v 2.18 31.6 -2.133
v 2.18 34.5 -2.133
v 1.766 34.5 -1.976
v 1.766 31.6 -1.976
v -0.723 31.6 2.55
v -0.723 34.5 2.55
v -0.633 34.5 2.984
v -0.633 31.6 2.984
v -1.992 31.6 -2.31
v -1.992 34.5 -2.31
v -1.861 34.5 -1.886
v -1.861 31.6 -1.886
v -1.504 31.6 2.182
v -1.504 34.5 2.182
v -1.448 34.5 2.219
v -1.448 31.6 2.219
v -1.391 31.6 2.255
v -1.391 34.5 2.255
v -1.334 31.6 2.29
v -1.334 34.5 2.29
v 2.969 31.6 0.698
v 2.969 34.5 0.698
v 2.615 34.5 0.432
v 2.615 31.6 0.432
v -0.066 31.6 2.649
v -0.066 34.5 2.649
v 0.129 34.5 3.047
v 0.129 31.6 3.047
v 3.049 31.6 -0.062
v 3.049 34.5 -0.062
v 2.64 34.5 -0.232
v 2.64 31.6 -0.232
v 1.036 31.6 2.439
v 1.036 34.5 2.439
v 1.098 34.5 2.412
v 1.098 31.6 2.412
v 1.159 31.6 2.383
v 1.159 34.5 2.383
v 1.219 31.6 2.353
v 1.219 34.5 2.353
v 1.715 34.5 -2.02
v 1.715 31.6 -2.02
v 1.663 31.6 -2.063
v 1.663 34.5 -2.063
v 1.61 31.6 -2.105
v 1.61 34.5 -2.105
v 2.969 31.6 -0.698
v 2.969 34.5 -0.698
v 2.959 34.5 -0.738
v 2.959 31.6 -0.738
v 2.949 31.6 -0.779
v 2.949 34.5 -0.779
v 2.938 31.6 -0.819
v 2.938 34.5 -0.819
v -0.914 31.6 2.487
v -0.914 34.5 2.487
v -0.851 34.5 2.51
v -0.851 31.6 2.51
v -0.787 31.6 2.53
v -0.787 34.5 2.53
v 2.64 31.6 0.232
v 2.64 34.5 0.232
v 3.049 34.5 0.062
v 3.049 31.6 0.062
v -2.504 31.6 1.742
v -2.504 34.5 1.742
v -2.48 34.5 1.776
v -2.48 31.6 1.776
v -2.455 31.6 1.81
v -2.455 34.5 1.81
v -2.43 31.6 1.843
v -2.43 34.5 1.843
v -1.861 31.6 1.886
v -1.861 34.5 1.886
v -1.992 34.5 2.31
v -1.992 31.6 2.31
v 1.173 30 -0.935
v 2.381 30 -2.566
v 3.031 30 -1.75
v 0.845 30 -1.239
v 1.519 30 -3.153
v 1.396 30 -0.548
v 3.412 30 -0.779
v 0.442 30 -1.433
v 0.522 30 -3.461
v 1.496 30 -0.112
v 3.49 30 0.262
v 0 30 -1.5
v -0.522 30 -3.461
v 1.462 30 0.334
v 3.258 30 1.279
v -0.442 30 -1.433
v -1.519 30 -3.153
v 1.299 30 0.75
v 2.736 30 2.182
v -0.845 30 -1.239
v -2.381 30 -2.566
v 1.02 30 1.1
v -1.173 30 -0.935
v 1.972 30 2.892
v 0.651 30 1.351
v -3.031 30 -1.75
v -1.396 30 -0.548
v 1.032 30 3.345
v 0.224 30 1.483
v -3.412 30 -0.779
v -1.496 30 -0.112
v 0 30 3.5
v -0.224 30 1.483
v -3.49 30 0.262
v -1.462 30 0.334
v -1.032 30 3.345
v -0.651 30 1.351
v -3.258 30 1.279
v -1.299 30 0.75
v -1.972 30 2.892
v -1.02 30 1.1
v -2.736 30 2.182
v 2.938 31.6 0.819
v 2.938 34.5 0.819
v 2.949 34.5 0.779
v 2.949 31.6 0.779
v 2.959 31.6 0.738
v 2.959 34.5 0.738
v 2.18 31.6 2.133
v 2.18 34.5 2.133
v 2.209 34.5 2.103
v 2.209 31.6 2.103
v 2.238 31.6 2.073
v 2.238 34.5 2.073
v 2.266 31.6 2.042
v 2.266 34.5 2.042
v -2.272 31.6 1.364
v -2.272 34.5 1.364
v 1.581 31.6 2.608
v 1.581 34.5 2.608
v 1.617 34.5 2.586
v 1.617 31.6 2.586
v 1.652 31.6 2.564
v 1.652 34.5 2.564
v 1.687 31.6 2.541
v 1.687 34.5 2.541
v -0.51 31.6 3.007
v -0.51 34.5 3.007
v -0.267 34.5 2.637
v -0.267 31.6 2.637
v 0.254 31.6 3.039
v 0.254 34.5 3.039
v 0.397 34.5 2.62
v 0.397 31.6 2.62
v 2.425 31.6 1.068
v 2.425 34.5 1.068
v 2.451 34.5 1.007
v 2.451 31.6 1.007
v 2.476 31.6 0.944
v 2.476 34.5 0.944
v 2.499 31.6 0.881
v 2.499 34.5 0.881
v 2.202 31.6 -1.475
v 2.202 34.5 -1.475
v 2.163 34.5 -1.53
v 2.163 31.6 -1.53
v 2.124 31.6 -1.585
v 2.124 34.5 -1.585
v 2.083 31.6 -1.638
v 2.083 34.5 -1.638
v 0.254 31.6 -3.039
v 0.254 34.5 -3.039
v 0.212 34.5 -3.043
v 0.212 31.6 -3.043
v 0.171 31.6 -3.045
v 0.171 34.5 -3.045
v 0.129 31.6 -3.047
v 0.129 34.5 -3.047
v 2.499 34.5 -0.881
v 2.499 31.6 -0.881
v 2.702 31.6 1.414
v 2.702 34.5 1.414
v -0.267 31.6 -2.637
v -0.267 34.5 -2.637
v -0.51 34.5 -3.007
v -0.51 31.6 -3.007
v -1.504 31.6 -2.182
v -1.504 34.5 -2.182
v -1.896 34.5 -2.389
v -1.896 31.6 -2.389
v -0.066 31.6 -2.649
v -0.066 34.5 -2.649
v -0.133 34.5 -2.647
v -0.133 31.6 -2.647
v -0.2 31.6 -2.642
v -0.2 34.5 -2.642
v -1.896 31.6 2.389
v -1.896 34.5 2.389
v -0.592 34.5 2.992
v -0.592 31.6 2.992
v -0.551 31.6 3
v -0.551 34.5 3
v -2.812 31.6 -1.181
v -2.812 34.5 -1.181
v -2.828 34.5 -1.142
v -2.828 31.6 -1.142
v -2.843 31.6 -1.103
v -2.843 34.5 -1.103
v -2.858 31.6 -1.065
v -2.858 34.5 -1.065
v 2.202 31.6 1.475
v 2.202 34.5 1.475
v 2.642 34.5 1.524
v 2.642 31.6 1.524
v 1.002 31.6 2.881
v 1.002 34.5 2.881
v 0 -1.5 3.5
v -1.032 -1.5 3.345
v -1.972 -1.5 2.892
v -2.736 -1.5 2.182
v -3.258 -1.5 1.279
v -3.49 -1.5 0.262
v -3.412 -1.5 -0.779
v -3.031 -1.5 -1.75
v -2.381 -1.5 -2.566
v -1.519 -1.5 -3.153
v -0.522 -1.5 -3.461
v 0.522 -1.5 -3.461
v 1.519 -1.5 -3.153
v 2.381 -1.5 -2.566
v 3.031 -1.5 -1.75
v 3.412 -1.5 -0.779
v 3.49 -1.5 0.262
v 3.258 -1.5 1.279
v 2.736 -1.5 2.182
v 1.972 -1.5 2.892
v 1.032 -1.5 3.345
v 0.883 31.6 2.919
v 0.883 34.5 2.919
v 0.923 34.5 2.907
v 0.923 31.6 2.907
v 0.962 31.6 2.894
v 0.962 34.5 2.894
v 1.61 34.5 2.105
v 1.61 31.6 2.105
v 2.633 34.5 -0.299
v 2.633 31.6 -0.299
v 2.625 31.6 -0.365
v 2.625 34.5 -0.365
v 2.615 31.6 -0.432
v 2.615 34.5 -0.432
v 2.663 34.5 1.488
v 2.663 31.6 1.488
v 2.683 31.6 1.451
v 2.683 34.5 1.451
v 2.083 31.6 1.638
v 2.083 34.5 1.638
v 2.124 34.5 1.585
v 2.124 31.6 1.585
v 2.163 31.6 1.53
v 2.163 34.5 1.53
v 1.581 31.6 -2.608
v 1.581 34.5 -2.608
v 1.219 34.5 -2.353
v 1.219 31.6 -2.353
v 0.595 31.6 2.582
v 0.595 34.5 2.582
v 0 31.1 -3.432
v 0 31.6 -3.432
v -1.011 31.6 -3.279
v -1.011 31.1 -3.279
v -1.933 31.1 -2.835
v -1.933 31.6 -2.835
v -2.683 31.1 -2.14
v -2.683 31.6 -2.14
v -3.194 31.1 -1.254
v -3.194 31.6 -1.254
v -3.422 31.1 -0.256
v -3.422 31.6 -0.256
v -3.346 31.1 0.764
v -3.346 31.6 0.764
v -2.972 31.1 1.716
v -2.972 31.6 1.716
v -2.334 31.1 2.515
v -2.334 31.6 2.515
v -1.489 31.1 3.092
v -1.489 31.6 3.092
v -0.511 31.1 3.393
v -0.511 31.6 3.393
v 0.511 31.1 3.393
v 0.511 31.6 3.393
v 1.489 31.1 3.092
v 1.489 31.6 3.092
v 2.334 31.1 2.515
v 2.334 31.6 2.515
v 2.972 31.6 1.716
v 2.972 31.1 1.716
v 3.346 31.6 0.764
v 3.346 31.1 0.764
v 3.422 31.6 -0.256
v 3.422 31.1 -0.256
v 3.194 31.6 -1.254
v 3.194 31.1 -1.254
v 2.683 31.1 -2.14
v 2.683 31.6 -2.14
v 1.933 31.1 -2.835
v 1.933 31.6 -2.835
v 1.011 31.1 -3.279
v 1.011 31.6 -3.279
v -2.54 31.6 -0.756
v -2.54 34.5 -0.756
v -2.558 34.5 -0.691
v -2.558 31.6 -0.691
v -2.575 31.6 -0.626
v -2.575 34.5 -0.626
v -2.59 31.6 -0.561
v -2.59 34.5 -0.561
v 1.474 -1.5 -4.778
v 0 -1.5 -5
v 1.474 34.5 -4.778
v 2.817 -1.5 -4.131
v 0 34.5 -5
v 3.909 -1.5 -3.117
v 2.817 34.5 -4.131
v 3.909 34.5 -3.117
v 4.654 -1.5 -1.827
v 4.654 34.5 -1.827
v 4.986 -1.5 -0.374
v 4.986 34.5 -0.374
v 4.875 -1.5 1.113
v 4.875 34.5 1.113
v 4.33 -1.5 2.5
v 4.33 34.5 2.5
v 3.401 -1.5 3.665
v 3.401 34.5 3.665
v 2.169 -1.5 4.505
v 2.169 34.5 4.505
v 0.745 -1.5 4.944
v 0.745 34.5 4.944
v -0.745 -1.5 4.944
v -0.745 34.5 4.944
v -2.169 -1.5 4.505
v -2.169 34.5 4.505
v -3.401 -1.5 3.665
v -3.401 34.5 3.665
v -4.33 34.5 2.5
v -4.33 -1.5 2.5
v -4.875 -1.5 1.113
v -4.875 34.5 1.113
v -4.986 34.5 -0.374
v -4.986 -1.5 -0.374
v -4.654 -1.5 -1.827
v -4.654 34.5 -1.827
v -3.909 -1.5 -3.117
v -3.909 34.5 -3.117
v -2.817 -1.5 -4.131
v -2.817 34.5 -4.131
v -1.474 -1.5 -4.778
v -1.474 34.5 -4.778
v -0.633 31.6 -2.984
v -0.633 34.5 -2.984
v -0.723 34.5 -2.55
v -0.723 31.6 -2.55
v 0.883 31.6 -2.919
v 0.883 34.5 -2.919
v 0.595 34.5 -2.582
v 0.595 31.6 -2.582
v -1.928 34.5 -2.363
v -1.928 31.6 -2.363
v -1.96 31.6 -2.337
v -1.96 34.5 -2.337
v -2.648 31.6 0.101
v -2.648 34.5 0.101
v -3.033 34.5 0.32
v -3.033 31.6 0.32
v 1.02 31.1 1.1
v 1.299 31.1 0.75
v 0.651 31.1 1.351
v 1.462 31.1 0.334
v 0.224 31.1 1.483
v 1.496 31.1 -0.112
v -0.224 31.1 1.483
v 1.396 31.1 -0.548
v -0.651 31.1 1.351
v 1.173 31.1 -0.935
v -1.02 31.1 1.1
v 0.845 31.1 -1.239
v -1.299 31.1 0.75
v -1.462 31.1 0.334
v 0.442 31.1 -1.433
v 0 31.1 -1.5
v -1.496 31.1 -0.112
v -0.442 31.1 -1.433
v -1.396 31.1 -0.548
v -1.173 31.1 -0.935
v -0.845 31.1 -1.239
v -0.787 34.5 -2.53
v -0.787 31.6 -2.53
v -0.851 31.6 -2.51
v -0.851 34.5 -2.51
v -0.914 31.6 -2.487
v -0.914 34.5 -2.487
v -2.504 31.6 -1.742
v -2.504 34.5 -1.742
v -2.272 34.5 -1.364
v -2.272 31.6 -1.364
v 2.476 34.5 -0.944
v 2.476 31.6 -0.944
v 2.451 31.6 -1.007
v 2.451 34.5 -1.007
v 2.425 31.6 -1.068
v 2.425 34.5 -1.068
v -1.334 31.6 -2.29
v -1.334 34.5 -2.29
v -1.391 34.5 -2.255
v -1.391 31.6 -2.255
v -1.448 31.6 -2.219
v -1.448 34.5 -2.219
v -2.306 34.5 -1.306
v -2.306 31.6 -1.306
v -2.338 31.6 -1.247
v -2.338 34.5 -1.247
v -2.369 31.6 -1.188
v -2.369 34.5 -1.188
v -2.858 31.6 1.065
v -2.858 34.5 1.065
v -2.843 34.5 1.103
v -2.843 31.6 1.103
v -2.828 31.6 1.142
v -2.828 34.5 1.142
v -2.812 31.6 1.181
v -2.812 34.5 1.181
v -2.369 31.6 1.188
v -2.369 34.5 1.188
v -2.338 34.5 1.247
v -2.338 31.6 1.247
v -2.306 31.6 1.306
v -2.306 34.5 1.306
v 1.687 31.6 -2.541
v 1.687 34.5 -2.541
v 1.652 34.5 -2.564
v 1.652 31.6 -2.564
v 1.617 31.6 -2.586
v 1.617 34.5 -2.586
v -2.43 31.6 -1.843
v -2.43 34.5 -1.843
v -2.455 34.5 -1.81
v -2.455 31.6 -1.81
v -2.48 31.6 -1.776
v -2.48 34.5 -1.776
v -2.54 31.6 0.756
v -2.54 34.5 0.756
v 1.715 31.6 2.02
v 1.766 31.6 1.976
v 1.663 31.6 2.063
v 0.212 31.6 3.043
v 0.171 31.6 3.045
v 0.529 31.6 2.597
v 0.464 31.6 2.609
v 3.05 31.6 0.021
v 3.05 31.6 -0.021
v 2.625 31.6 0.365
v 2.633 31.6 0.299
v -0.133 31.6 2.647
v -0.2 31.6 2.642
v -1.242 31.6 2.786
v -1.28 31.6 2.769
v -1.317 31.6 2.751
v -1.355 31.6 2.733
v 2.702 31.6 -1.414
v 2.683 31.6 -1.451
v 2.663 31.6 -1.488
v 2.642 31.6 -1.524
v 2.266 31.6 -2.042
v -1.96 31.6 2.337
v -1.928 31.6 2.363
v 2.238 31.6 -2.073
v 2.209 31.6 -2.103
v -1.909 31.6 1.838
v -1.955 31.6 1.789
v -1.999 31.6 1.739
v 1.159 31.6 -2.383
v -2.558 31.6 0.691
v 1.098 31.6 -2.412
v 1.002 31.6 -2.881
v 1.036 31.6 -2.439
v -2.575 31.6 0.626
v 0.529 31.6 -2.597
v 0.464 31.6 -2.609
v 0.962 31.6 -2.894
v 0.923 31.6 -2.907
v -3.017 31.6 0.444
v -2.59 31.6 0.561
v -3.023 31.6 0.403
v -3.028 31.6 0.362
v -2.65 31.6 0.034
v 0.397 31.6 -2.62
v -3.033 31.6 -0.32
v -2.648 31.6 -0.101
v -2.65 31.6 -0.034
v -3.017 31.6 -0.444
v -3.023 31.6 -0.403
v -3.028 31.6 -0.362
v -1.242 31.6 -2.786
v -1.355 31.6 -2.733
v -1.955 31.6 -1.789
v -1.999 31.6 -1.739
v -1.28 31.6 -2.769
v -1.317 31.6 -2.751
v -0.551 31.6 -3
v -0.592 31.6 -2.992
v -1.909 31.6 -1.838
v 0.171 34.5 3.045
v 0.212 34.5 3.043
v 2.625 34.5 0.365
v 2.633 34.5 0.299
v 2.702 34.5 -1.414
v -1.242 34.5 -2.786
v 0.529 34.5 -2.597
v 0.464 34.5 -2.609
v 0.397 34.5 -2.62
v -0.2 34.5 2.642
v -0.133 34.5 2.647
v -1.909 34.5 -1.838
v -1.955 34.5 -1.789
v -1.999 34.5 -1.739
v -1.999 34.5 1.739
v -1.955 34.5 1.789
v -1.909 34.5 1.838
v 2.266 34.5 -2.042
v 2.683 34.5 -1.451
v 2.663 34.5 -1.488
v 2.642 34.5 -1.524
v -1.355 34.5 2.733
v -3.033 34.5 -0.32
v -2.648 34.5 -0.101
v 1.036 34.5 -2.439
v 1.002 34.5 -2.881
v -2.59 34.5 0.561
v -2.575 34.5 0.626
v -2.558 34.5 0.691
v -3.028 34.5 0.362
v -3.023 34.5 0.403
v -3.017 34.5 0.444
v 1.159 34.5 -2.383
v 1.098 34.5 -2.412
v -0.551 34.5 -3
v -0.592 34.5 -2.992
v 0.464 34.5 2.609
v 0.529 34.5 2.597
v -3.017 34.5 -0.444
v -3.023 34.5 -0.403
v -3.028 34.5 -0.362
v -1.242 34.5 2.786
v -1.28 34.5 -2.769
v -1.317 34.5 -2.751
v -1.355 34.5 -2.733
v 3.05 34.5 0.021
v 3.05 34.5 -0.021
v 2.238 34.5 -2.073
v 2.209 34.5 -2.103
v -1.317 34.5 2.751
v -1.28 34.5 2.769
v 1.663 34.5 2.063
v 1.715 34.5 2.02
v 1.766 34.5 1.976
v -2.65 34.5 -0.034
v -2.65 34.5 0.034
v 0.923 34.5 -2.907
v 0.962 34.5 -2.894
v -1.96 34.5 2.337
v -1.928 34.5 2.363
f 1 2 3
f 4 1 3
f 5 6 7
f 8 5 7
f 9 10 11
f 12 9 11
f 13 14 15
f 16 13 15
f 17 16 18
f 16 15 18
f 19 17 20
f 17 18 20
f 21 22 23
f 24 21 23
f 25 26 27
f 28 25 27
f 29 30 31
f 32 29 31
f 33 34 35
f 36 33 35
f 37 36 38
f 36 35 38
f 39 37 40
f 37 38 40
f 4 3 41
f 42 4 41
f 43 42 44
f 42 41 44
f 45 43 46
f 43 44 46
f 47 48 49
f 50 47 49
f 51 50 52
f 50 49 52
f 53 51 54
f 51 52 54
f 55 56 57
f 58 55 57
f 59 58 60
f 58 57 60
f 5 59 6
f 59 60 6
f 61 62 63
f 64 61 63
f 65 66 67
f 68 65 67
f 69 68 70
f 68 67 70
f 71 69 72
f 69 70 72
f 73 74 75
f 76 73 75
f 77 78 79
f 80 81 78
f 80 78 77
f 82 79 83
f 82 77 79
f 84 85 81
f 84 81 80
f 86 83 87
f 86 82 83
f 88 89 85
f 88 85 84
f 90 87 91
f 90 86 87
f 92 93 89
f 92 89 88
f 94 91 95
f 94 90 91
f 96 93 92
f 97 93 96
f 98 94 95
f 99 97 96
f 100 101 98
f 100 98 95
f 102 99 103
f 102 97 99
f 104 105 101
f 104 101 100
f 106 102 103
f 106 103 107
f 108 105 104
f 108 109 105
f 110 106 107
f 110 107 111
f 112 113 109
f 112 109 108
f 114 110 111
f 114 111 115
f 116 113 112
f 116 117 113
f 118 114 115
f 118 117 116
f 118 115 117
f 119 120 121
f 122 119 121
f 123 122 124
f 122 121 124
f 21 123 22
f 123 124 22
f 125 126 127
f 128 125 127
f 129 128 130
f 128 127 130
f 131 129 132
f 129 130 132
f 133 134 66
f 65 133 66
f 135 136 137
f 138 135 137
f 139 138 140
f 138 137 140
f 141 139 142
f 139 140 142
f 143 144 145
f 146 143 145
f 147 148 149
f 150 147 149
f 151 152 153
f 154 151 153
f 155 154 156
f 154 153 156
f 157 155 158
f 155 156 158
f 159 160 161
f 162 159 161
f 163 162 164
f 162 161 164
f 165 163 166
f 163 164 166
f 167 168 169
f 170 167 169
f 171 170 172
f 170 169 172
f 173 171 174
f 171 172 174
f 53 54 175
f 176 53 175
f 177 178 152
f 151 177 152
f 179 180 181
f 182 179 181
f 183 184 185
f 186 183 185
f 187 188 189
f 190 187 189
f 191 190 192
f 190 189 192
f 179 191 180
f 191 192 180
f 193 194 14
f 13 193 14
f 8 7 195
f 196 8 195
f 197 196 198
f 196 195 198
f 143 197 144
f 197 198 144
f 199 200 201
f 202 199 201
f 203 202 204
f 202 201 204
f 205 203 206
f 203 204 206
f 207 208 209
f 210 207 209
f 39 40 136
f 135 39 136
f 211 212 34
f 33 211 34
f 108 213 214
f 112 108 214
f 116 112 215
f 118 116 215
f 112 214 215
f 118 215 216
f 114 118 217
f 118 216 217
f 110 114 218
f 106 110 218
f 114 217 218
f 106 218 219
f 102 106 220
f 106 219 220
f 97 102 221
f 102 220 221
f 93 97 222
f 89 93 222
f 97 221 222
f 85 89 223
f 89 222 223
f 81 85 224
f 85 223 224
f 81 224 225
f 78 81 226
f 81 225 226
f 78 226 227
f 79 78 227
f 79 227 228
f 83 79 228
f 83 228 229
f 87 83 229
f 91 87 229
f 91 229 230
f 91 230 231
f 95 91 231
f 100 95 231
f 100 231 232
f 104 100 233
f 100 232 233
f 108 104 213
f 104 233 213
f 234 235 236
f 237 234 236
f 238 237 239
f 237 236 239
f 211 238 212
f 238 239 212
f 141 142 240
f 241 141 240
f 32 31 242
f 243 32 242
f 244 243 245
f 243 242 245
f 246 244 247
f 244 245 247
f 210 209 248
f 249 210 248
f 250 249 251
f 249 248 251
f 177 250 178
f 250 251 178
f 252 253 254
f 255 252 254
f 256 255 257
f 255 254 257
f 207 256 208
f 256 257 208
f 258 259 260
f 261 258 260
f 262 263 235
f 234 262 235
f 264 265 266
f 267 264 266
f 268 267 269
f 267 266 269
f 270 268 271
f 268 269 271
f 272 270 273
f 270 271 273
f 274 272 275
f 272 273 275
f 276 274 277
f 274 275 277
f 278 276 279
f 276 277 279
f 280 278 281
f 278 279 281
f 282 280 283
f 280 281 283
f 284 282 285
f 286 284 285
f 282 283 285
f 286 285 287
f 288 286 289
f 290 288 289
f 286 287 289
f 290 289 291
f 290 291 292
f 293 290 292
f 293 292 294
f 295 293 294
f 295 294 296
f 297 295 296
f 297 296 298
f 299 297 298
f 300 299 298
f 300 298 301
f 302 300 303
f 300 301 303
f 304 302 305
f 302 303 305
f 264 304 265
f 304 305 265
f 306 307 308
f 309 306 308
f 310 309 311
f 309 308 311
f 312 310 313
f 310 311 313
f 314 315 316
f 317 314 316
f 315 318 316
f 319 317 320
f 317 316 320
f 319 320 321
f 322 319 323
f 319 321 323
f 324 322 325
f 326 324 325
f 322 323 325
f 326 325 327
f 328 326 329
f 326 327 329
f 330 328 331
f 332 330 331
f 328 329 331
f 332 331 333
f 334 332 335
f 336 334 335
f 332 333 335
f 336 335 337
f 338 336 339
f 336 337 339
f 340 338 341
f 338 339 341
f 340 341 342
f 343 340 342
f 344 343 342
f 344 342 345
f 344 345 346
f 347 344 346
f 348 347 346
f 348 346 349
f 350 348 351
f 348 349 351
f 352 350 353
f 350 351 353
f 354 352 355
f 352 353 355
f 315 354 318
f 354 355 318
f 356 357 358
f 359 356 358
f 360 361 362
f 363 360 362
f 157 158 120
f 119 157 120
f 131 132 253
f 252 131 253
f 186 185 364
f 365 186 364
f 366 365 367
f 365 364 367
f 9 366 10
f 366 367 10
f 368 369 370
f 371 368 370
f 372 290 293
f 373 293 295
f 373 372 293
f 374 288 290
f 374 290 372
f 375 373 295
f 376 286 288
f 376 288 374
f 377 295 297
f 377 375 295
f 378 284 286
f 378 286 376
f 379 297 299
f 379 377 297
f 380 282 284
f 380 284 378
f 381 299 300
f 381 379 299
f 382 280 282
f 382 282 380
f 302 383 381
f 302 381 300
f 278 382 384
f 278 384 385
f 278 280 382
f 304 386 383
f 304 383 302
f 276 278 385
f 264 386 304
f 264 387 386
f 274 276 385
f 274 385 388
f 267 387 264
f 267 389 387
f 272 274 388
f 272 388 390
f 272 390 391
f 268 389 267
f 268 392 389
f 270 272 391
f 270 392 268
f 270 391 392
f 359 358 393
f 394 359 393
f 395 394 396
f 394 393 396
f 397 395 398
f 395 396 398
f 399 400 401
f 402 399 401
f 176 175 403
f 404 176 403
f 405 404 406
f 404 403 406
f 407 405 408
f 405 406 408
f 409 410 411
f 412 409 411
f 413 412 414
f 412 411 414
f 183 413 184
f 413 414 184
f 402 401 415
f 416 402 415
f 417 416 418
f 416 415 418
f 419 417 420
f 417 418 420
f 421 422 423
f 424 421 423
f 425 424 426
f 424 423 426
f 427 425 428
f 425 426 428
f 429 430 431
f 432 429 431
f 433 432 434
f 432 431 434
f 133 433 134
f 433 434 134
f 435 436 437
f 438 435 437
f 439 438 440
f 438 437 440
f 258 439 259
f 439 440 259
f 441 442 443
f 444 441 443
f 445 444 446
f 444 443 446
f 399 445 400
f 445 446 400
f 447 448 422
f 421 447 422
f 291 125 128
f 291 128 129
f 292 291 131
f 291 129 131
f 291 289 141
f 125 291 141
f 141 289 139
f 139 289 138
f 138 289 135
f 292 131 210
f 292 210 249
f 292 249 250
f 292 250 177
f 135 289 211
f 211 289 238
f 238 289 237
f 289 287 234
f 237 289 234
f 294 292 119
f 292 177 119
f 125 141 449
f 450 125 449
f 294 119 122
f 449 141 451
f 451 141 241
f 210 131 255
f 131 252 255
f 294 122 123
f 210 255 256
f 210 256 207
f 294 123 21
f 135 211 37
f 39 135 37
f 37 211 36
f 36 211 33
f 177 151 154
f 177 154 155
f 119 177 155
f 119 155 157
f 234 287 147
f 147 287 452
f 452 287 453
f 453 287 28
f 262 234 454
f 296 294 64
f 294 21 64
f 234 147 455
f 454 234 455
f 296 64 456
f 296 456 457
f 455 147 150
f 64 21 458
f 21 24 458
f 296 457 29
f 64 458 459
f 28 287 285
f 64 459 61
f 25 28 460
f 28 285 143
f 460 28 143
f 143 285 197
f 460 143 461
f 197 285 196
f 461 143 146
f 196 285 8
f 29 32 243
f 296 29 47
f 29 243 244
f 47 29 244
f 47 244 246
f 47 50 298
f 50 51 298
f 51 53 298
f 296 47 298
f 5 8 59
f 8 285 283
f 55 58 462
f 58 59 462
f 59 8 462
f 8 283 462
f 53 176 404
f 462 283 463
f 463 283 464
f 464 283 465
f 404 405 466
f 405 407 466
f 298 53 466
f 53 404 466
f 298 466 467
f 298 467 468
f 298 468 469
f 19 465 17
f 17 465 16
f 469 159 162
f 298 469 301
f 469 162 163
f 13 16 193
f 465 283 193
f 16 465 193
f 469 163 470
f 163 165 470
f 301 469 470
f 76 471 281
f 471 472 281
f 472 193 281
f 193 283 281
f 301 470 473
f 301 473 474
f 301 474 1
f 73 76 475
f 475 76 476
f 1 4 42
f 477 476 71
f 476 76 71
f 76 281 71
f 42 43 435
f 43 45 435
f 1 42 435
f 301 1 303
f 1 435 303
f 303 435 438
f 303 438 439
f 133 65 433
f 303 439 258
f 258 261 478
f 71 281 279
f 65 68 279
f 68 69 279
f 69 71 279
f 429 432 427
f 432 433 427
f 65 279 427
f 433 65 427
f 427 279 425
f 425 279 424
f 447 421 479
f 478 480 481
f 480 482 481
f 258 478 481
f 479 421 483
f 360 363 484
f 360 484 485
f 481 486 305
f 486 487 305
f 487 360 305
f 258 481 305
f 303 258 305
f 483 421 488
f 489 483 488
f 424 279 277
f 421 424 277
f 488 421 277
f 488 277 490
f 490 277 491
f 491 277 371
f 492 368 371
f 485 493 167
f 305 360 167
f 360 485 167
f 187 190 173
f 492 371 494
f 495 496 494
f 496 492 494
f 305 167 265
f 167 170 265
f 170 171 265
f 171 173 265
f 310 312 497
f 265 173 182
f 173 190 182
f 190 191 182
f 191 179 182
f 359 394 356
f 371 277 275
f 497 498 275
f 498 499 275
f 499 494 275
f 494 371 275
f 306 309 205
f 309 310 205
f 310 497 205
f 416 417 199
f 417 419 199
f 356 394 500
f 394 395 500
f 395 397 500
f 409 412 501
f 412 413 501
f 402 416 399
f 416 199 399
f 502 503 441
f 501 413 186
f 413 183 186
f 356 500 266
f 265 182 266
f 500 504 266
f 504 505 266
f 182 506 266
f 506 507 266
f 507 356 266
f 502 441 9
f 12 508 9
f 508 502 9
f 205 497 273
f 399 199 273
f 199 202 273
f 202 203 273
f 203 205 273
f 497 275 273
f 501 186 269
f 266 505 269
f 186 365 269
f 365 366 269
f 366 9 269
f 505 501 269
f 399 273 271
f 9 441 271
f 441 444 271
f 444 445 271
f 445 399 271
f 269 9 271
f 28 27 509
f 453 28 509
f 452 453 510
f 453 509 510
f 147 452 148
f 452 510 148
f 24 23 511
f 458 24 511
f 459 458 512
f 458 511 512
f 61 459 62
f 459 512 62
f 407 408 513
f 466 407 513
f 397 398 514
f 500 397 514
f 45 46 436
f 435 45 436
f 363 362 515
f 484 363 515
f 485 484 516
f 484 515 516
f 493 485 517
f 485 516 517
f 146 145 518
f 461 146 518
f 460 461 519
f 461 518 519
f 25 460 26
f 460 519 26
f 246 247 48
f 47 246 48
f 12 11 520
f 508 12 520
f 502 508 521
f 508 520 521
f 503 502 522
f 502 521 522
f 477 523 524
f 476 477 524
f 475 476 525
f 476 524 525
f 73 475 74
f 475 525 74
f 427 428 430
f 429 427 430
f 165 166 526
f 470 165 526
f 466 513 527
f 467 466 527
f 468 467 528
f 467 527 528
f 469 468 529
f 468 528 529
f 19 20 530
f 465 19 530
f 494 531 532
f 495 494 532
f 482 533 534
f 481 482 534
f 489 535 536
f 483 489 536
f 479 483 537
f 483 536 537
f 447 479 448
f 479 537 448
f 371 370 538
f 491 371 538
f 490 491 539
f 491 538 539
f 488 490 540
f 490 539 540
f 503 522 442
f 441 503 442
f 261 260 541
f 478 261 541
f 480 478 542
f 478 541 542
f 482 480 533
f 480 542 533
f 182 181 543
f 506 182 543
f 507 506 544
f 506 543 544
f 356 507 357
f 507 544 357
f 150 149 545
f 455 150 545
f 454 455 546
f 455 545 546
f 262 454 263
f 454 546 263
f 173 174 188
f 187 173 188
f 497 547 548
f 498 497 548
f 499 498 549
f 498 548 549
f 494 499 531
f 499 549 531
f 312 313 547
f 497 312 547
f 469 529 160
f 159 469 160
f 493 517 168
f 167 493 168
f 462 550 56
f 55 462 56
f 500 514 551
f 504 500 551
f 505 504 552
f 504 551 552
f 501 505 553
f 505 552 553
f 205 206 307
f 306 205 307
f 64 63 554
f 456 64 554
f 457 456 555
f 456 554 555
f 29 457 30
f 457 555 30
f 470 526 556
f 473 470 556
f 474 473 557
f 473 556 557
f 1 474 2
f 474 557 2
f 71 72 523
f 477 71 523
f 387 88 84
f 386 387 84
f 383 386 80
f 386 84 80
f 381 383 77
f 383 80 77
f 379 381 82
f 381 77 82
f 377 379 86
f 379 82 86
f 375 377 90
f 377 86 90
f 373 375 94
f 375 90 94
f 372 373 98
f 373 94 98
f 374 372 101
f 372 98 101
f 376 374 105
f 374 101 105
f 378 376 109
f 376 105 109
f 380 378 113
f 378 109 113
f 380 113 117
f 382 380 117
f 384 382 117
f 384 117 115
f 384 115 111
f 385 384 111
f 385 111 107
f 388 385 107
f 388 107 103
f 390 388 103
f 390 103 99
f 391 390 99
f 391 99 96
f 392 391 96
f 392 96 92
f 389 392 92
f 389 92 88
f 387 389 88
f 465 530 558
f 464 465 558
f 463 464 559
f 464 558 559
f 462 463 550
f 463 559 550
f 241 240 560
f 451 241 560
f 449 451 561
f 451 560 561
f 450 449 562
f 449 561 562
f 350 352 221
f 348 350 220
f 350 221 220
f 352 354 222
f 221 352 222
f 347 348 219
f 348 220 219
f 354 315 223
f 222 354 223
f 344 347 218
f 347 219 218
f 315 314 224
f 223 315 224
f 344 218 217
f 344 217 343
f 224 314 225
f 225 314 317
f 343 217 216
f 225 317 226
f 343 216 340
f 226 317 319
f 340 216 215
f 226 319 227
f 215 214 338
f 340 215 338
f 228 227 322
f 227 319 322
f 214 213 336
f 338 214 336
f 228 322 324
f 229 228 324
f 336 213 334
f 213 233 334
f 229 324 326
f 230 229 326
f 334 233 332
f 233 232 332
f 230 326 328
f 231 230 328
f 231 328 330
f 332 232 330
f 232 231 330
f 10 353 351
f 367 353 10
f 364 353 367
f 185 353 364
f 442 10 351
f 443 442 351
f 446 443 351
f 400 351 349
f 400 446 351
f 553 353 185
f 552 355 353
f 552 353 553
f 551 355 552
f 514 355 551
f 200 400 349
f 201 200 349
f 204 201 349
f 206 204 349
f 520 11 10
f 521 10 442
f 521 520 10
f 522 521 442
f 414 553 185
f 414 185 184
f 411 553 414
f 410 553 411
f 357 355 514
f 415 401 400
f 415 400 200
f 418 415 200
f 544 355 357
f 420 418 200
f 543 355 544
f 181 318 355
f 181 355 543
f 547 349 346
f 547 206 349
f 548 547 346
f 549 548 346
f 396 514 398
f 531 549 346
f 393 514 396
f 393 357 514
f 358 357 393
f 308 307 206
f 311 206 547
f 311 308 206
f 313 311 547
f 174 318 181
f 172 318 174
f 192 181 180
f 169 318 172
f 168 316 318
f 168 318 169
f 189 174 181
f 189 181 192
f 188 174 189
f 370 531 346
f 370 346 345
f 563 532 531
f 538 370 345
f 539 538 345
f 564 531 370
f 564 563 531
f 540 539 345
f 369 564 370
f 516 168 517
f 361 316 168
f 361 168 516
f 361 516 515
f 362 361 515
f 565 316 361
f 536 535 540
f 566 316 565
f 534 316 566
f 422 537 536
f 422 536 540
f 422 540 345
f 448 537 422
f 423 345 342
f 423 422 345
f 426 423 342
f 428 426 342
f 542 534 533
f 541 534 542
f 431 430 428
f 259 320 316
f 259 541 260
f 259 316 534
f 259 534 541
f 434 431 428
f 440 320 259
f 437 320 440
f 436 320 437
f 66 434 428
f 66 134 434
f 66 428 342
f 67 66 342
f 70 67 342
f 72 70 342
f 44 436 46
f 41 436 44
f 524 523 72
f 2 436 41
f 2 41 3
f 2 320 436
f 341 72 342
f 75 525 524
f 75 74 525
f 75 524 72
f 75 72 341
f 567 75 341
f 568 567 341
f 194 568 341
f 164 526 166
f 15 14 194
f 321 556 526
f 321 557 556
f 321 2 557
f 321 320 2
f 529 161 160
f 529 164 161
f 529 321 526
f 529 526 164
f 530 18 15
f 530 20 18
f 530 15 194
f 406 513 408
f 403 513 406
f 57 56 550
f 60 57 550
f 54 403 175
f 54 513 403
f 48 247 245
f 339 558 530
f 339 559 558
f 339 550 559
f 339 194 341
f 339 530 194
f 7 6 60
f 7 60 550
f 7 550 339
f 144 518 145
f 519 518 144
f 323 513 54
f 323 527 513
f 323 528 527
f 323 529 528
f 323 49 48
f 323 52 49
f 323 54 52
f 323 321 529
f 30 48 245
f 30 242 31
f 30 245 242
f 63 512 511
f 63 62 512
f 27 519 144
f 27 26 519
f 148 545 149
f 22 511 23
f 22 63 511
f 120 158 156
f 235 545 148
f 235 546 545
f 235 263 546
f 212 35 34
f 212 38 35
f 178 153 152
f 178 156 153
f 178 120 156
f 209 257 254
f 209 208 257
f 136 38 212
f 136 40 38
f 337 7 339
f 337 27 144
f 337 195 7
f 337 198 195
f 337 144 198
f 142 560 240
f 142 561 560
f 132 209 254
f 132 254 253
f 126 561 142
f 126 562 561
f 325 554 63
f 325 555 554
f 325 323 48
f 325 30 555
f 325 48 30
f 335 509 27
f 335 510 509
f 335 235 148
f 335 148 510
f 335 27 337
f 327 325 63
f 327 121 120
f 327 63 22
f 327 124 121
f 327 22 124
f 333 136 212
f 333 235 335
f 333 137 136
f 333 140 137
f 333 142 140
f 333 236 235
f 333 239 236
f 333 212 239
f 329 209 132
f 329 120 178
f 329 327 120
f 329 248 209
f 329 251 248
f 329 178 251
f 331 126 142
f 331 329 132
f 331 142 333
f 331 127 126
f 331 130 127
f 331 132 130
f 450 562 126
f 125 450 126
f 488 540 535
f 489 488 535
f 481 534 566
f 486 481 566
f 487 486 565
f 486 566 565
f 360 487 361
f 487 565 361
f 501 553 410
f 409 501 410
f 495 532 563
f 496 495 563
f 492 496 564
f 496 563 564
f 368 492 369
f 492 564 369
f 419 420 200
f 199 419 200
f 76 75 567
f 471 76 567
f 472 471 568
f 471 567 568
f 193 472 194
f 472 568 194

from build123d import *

# Parameters (mm, degrees)
SKETCH1_W          = 5
SKETCH1_H          = 36
SKETCH2_R          = 3.43154
CUT_EXTRUDE1_DEPTH = 0.5
SKETCH3_R          = 3.5
CUT_EXTRUDE2_DEPTH = 31.5
CUT_EXTRUDE3_REACH = 34.284
SKETCH4_R          = 1.5
CUT_EXTRUDE4_REACH = 38.688


with BuildPart() as part:
    # Sketch1 → Revolve1 (revolve)
    with BuildSketch(Plane.XY, mode=Mode.PRIVATE) as revolve1_sk:
        with Locations((2.5, 16.5)):
            Rectangle(SKETCH1_W, SKETCH1_H)
    revolve(revolve1_sk.sketch.rotate(Axis((0, 34.5, 0), (0, -1, 0)), 270), axis=Axis((0, 34.5, 0), (0, -1, 0)))

    # Sketch2 → Cut-Extrude1 (cut)
    with BuildSketch(Plane(origin=(0, 31.6, 0), x_dir=(1, 0, 0), z_dir=(0, 1, 0))):
        with Locations(Location((0, 0, 0), (0, 0, 90))):
            Circle(SKETCH2_R)
    extrude(amount=-CUT_EXTRUDE1_DEPTH, mode=Mode.SUBTRACT)

    # Sketch3 → Cut-Extrude2 (cut)
    with BuildSketch(Plane.XZ.offset(1.5)):
        with Locations(Location((0, 0, 0), (0, 0, 90))):
            Circle(SKETCH3_R)
    extrude(amount=-CUT_EXTRUDE2_DEPTH, mode=Mode.SUBTRACT)

    # Sketch4 → Cut-Extrude3 (cut, up to next)
    with BuildSketch(Plane.XZ.offset(-30), mode=Mode.PRIVATE) as cut_extrude3_sk1:
        with Locations(Location((0, 0, 0), (0, 0, 270))):
            Circle(SKETCH4_R)
    cut_extrude3_tool1 = extrude(cut_extrude3_sk1.sketch, amount=-CUT_EXTRUDE3_REACH, mode=Mode.PRIVATE) & part.part
    add(cut_extrude3_tool1.solids().sort_by_distance((0, 30, 0))[0], mode=Mode.SUBTRACT)

    # Sketch5 → Cut-Extrude4 (cut, up to next)
    with BuildSketch(Plane(origin=(0, 34.5, 0), x_dir=(-1, 0, 0), z_dir=(0, 1, 0)), mode=Mode.PRIVATE) as cut_extrude4_sk1:
        with BuildLine():
            Line((2.430309722, 1.842849602), (1.999275165, 1.739367361))
            ThreePointArc((1.999275165, 1.739367361), (1.931766863, 1.814049831), (1.861470643, 1.886114272))
            Line((1.861470643, 1.886114272), (1.991813569, 2.309800577))
            ThreePointArc((1.991813569, 2.309800577), (1.944143169, 2.35006539), (1.895659013, 2.389346544))
            Line((1.895659013, 2.389346544), (1.503901187, 2.181921452))
            ThreePointArc((1.503901187, 2.181921452), (1.419941007, 2.237469003), (1.333931574, 2.289787448))
            Line((1.333931574, 2.289787448), (1.354813039, 2.732577836))
            ThreePointArc((1.354813039, 2.732577836), (1.298626839, 2.75972251), (1.241897077, 2.785712054))
            Line((1.241897077, 2.785712054), (0.914031566, 2.487377393))
            ThreePointArc((0.914031566, 2.487377393), (0.818895035, 2.520299768), (0.722576679, 2.549584857))
            Line((0.722576679, 2.549584857), (0.632684622, 2.98365718))
            ThreePointArc((0.632684622, 2.98365718), (0.571513009, 2.995976115), (0.51010218, 3.007041032))
            Line((0.51010218, 3.007041032), (0.26672998, 2.636542265))
            ThreePointArc((0.26672998, 2.636542265), (0.166394877, 2.64477083), (0.065819633, 2.649182473))
            Line((0.065819633, 2.649182473), (-0.129197696, 3.047262371))
            ThreePointArc((-0.129197696, 3.047262371), (-0.191511085, 3.043981522), (-0.253744312, 3.039426562))
            Line((-0.253744312, 3.039426562), (-0.397331231, 2.620043491))
            ThreePointArc((-0.397331231, 2.620043491), (-0.496560484, 2.603061214), (-0.595073102, 2.582322211))
            Line((-0.595073102, 2.582322211), (-0.882962048, 2.919396859))
            ThreePointArc((-0.882962048, 2.919396859), (-0.942501833, 2.900722375), (-1.001647117, 2.880833743))
            Line((-1.001647117, 2.880833743), (-1.03642666, 2.438917747))
            ThreePointArc((-1.03642666, 2.438917747), (-1.128315123, 2.397791689), (-1.218575206, 2.353205148))
            Line((-1.218575206, 2.353205148), (-1.581246647, 2.608094906))
            ThreePointArc((-1.581246647, 2.608094906), (-1.634271725, 2.575200173), (-1.686612749, 2.541227545))
            Line((-1.686612749, 2.541227545), (-1.61039959, 2.104545832))
            ThreePointArc((-1.61039959, 2.104545832), (-1.689173573, 2.041860093), (-1.765509747, 1.976227551))
            Line((-1.765509747, 1.976227551), (-2.180175704, 2.132916759))
            ThreePointArc((-2.180175704, 2.132916759), (-2.223354314, 2.087868673), (-2.2656023, 2.041946674))
            Line((-2.2656023, 2.041946674), (-2.083185191, 1.637937563))
            ThreePointArc((-2.083185191, 1.637937563), (-2.143895035, 1.557630919), (-2.201510819, 1.475076308))
            Line((-2.201510819, 1.475076308), (-2.642116303, 1.523719607))
            ThreePointArc((-2.642116303, 1.523719607), (-2.672735374, 1.469348706), (-2.702235725, 1.414362784))
            Line((-2.702235725, 1.414362784), (-2.425076605, 1.068411652))
            ThreePointArc((-2.425076605, 1.068411652), (-2.463907688, 0.975530065), (-2.499182869, 0.881240596))
            Line((-2.499182869, 0.881240596), (-2.938043018, 0.818781548))
            ThreePointArc((-2.938043018, 0.818781548), (-2.954178641, 0.758504156), (-2.969077742, 0.697909279))
            Line((-2.969077742, 0.697909279), (-2.614591538, 0.431753508))
            ThreePointArc((-2.614591538, 0.431753508), (-2.629103958, 0.332133069), (-2.639822068, 0.232033297))
            Line((-2.639822068, 0.232033297), (-3.049361685, 0.062396433))
            ThreePointArc((-3.049361685, 0.062396433), (-3.05, 0), (-3.049361685, -0.062396433))
            Line((-3.049361685, -0.062396433), (-2.639822068, -0.232033297))
            ThreePointArc((-2.639822068, -0.232033297), (-2.629103958, -0.332133069), (-2.614591538, -0.431753508))
            Line((-2.614591538, -0.431753508), (-2.969077742, -0.697909279))
            ThreePointArc((-2.969077742, -0.697909279), (-2.954178641, -0.758504156), (-2.938043018, -0.818781548))
            Line((-2.938043018, -0.818781548), (-2.499182869, -0.881240596))
            ThreePointArc((-2.499182869, -0.881240596), (-2.463907688, -0.975530065), (-2.425076605, -1.068411652))
            Line((-2.425076605, -1.068411652), (-2.702235725, -1.414362784))
            ThreePointArc((-2.702235725, -1.414362784), (-2.672735374, -1.469348706), (-2.642116303, -1.523719607))
            Line((-2.642116303, -1.523719607), (-2.201510819, -1.475076308))
            ThreePointArc((-2.201510819, -1.475076308), (-2.143895035, -1.557630919), (-2.083185191, -1.637937563))
            Line((-2.083185191, -1.637937563), (-2.2656023, -2.041946674))
            ThreePointArc((-2.2656023, -2.041946674), (-2.223354314, -2.087868673), (-2.180175704, -2.132916759))
            Line((-2.180175704, -2.132916759), (-1.765509747, -1.976227551))
            ThreePointArc((-1.765509747, -1.976227551), (-1.689173573, -2.041860093), (-1.61039959, -2.104545832))
            Line((-1.61039959, -2.104545832), (-1.686612749, -2.541227545))
            ThreePointArc((-1.686612749, -2.541227545), (-1.634271725, -2.575200173), (-1.581246647, -2.608094906))
            Line((-1.581246647, -2.608094906), (-1.218575206, -2.353205148))
            ThreePointArc((-1.218575206, -2.353205148), (-1.128315123, -2.397791689), (-1.03642666, -2.438917747))
            Line((-1.03642666, -2.438917747), (-1.001647117, -2.880833743))
            ThreePointArc((-1.001647117, -2.880833743), (-0.942501833, -2.900722375), (-0.882962048, -2.919396859))
            Line((-0.882962048, -2.919396859), (-0.595073102, -2.582322211))
            ThreePointArc((-0.595073102, -2.582322211), (-0.496560484, -2.603061214), (-0.397331231, -2.620043491))
            Line((-0.397331231, -2.620043491), (-0.253744312, -3.039426562))
            ThreePointArc((-0.253744312, -3.039426562), (-0.191511085, -3.043981522), (-0.129197696, -3.047262371))
            Line((-0.129197696, -3.047262371), (0.065819633, -2.649182473))
            ThreePointArc((0.065819633, -2.649182473), (0.166394877, -2.64477083), (0.26672998, -2.636542265))
            Line((0.26672998, -2.636542265), (0.51010218, -3.007041032))
            ThreePointArc((0.51010218, -3.007041032), (0.571513009, -2.995976115), (0.632684622, -2.98365718))
            Line((0.632684622, -2.98365718), (0.722576679, -2.549584857))
            ThreePointArc((0.722576679, -2.549584857), (0.818895035, -2.520299768), (0.914031566, -2.487377393))
            Line((0.914031566, -2.487377393), (1.241897077, -2.785712054))
            ThreePointArc((1.241897077, -2.785712054), (1.298626839, -2.75972251), (1.354813039, -2.732577836))
            Line((1.354813039, -2.732577836), (1.333931574, -2.289787448))
            ThreePointArc((1.333931574, -2.289787448), (1.419941007, -2.237469003), (1.503901187, -2.181921452))
            Line((1.503901187, -2.181921452), (1.895659013, -2.389346544))
            ThreePointArc((1.895659013, -2.389346544), (1.944143169, -2.35006539), (1.991813569, -2.309800577))
            Line((1.991813569, -2.309800577), (1.861470643, -1.886114272))
            ThreePointArc((1.861470643, -1.886114272), (1.931766863, -1.814049831), (1.999275165, -1.739367361))
            Line((1.999275165, -1.739367361), (2.430309722, -1.842849602))
            ThreePointArc((2.430309722, -1.842849602), (2.467501833, -1.792745019), (2.503661128, -1.741890052))
            Line((2.503661128, -1.741890052), (2.272046665, -1.3639296))
            ThreePointArc((2.272046665, -1.3639296), (2.322212702, -1.276647236), (2.369027332, -1.187522421))
            Line((2.369027332, -1.187522421), (2.812255133, -1.180559643))
            ThreePointArc((2.812255133, -1.180559643), (2.835818282, -1.122779886), (2.858194451, -1.06453017))
            Line((2.858194451, -1.06453017), (2.539861639, -0.756044214))
            ThreePointArc((2.539861639, -0.756044214), (2.566745377, -0.659028201), (2.589924799, -0.561061081))
            Line((2.589924799, -0.561061081), (3.01749621, -0.444090779))
            ThreePointArc((3.01749621, -0.444090779), (3.025949839, -0.382266362), (3.033136904, -0.320281942))
            Line((3.033136904, -0.320281942), (2.648087766, -0.100653791))
            ThreePointArc((2.648087766, -0.100653791), (2.65, 0), (2.648087766, 0.100653791))
            Line((2.648087766, 0.100653791), (3.033136904, 0.320281942))
            ThreePointArc((3.033136904, 0.320281942), (3.025949839, 0.382266362), (3.01749621, 0.444090779))
            Line((3.01749621, 0.444090779), (2.589924799, 0.561061081))
            ThreePointArc((2.589924799, 0.561061081), (2.566745377, 0.659028201), (2.539861639, 0.756044214))
            Line((2.539861639, 0.756044214), (2.858194451, 1.06453017))
            ThreePointArc((2.858194451, 1.06453017), (2.835818282, 1.122779886), (2.812255133, 1.180559643))
            Line((2.812255133, 1.180559643), (2.369027332, 1.187522421))
            ThreePointArc((2.369027332, 1.187522421), (2.322212702, 1.276647236), (2.272046665, 1.3639296))
            Line((2.272046665, 1.3639296), (2.503661128, 1.741890052))
            ThreePointArc((2.503661128, 1.741890052), (2.467501833, 1.792745019), (2.430309722, 1.842849602))
        make_face()
    cut_extrude4_tool1 = extrude(cut_extrude4_sk1.sketch, amount=-CUT_EXTRUDE4_REACH, mode=Mode.PRIVATE) & part.part
    add(cut_extrude4_tool1.solids().sort_by_distance((0, 34.5, 0))[0], mode=Mode.SUBTRACT)


solid = part.part
